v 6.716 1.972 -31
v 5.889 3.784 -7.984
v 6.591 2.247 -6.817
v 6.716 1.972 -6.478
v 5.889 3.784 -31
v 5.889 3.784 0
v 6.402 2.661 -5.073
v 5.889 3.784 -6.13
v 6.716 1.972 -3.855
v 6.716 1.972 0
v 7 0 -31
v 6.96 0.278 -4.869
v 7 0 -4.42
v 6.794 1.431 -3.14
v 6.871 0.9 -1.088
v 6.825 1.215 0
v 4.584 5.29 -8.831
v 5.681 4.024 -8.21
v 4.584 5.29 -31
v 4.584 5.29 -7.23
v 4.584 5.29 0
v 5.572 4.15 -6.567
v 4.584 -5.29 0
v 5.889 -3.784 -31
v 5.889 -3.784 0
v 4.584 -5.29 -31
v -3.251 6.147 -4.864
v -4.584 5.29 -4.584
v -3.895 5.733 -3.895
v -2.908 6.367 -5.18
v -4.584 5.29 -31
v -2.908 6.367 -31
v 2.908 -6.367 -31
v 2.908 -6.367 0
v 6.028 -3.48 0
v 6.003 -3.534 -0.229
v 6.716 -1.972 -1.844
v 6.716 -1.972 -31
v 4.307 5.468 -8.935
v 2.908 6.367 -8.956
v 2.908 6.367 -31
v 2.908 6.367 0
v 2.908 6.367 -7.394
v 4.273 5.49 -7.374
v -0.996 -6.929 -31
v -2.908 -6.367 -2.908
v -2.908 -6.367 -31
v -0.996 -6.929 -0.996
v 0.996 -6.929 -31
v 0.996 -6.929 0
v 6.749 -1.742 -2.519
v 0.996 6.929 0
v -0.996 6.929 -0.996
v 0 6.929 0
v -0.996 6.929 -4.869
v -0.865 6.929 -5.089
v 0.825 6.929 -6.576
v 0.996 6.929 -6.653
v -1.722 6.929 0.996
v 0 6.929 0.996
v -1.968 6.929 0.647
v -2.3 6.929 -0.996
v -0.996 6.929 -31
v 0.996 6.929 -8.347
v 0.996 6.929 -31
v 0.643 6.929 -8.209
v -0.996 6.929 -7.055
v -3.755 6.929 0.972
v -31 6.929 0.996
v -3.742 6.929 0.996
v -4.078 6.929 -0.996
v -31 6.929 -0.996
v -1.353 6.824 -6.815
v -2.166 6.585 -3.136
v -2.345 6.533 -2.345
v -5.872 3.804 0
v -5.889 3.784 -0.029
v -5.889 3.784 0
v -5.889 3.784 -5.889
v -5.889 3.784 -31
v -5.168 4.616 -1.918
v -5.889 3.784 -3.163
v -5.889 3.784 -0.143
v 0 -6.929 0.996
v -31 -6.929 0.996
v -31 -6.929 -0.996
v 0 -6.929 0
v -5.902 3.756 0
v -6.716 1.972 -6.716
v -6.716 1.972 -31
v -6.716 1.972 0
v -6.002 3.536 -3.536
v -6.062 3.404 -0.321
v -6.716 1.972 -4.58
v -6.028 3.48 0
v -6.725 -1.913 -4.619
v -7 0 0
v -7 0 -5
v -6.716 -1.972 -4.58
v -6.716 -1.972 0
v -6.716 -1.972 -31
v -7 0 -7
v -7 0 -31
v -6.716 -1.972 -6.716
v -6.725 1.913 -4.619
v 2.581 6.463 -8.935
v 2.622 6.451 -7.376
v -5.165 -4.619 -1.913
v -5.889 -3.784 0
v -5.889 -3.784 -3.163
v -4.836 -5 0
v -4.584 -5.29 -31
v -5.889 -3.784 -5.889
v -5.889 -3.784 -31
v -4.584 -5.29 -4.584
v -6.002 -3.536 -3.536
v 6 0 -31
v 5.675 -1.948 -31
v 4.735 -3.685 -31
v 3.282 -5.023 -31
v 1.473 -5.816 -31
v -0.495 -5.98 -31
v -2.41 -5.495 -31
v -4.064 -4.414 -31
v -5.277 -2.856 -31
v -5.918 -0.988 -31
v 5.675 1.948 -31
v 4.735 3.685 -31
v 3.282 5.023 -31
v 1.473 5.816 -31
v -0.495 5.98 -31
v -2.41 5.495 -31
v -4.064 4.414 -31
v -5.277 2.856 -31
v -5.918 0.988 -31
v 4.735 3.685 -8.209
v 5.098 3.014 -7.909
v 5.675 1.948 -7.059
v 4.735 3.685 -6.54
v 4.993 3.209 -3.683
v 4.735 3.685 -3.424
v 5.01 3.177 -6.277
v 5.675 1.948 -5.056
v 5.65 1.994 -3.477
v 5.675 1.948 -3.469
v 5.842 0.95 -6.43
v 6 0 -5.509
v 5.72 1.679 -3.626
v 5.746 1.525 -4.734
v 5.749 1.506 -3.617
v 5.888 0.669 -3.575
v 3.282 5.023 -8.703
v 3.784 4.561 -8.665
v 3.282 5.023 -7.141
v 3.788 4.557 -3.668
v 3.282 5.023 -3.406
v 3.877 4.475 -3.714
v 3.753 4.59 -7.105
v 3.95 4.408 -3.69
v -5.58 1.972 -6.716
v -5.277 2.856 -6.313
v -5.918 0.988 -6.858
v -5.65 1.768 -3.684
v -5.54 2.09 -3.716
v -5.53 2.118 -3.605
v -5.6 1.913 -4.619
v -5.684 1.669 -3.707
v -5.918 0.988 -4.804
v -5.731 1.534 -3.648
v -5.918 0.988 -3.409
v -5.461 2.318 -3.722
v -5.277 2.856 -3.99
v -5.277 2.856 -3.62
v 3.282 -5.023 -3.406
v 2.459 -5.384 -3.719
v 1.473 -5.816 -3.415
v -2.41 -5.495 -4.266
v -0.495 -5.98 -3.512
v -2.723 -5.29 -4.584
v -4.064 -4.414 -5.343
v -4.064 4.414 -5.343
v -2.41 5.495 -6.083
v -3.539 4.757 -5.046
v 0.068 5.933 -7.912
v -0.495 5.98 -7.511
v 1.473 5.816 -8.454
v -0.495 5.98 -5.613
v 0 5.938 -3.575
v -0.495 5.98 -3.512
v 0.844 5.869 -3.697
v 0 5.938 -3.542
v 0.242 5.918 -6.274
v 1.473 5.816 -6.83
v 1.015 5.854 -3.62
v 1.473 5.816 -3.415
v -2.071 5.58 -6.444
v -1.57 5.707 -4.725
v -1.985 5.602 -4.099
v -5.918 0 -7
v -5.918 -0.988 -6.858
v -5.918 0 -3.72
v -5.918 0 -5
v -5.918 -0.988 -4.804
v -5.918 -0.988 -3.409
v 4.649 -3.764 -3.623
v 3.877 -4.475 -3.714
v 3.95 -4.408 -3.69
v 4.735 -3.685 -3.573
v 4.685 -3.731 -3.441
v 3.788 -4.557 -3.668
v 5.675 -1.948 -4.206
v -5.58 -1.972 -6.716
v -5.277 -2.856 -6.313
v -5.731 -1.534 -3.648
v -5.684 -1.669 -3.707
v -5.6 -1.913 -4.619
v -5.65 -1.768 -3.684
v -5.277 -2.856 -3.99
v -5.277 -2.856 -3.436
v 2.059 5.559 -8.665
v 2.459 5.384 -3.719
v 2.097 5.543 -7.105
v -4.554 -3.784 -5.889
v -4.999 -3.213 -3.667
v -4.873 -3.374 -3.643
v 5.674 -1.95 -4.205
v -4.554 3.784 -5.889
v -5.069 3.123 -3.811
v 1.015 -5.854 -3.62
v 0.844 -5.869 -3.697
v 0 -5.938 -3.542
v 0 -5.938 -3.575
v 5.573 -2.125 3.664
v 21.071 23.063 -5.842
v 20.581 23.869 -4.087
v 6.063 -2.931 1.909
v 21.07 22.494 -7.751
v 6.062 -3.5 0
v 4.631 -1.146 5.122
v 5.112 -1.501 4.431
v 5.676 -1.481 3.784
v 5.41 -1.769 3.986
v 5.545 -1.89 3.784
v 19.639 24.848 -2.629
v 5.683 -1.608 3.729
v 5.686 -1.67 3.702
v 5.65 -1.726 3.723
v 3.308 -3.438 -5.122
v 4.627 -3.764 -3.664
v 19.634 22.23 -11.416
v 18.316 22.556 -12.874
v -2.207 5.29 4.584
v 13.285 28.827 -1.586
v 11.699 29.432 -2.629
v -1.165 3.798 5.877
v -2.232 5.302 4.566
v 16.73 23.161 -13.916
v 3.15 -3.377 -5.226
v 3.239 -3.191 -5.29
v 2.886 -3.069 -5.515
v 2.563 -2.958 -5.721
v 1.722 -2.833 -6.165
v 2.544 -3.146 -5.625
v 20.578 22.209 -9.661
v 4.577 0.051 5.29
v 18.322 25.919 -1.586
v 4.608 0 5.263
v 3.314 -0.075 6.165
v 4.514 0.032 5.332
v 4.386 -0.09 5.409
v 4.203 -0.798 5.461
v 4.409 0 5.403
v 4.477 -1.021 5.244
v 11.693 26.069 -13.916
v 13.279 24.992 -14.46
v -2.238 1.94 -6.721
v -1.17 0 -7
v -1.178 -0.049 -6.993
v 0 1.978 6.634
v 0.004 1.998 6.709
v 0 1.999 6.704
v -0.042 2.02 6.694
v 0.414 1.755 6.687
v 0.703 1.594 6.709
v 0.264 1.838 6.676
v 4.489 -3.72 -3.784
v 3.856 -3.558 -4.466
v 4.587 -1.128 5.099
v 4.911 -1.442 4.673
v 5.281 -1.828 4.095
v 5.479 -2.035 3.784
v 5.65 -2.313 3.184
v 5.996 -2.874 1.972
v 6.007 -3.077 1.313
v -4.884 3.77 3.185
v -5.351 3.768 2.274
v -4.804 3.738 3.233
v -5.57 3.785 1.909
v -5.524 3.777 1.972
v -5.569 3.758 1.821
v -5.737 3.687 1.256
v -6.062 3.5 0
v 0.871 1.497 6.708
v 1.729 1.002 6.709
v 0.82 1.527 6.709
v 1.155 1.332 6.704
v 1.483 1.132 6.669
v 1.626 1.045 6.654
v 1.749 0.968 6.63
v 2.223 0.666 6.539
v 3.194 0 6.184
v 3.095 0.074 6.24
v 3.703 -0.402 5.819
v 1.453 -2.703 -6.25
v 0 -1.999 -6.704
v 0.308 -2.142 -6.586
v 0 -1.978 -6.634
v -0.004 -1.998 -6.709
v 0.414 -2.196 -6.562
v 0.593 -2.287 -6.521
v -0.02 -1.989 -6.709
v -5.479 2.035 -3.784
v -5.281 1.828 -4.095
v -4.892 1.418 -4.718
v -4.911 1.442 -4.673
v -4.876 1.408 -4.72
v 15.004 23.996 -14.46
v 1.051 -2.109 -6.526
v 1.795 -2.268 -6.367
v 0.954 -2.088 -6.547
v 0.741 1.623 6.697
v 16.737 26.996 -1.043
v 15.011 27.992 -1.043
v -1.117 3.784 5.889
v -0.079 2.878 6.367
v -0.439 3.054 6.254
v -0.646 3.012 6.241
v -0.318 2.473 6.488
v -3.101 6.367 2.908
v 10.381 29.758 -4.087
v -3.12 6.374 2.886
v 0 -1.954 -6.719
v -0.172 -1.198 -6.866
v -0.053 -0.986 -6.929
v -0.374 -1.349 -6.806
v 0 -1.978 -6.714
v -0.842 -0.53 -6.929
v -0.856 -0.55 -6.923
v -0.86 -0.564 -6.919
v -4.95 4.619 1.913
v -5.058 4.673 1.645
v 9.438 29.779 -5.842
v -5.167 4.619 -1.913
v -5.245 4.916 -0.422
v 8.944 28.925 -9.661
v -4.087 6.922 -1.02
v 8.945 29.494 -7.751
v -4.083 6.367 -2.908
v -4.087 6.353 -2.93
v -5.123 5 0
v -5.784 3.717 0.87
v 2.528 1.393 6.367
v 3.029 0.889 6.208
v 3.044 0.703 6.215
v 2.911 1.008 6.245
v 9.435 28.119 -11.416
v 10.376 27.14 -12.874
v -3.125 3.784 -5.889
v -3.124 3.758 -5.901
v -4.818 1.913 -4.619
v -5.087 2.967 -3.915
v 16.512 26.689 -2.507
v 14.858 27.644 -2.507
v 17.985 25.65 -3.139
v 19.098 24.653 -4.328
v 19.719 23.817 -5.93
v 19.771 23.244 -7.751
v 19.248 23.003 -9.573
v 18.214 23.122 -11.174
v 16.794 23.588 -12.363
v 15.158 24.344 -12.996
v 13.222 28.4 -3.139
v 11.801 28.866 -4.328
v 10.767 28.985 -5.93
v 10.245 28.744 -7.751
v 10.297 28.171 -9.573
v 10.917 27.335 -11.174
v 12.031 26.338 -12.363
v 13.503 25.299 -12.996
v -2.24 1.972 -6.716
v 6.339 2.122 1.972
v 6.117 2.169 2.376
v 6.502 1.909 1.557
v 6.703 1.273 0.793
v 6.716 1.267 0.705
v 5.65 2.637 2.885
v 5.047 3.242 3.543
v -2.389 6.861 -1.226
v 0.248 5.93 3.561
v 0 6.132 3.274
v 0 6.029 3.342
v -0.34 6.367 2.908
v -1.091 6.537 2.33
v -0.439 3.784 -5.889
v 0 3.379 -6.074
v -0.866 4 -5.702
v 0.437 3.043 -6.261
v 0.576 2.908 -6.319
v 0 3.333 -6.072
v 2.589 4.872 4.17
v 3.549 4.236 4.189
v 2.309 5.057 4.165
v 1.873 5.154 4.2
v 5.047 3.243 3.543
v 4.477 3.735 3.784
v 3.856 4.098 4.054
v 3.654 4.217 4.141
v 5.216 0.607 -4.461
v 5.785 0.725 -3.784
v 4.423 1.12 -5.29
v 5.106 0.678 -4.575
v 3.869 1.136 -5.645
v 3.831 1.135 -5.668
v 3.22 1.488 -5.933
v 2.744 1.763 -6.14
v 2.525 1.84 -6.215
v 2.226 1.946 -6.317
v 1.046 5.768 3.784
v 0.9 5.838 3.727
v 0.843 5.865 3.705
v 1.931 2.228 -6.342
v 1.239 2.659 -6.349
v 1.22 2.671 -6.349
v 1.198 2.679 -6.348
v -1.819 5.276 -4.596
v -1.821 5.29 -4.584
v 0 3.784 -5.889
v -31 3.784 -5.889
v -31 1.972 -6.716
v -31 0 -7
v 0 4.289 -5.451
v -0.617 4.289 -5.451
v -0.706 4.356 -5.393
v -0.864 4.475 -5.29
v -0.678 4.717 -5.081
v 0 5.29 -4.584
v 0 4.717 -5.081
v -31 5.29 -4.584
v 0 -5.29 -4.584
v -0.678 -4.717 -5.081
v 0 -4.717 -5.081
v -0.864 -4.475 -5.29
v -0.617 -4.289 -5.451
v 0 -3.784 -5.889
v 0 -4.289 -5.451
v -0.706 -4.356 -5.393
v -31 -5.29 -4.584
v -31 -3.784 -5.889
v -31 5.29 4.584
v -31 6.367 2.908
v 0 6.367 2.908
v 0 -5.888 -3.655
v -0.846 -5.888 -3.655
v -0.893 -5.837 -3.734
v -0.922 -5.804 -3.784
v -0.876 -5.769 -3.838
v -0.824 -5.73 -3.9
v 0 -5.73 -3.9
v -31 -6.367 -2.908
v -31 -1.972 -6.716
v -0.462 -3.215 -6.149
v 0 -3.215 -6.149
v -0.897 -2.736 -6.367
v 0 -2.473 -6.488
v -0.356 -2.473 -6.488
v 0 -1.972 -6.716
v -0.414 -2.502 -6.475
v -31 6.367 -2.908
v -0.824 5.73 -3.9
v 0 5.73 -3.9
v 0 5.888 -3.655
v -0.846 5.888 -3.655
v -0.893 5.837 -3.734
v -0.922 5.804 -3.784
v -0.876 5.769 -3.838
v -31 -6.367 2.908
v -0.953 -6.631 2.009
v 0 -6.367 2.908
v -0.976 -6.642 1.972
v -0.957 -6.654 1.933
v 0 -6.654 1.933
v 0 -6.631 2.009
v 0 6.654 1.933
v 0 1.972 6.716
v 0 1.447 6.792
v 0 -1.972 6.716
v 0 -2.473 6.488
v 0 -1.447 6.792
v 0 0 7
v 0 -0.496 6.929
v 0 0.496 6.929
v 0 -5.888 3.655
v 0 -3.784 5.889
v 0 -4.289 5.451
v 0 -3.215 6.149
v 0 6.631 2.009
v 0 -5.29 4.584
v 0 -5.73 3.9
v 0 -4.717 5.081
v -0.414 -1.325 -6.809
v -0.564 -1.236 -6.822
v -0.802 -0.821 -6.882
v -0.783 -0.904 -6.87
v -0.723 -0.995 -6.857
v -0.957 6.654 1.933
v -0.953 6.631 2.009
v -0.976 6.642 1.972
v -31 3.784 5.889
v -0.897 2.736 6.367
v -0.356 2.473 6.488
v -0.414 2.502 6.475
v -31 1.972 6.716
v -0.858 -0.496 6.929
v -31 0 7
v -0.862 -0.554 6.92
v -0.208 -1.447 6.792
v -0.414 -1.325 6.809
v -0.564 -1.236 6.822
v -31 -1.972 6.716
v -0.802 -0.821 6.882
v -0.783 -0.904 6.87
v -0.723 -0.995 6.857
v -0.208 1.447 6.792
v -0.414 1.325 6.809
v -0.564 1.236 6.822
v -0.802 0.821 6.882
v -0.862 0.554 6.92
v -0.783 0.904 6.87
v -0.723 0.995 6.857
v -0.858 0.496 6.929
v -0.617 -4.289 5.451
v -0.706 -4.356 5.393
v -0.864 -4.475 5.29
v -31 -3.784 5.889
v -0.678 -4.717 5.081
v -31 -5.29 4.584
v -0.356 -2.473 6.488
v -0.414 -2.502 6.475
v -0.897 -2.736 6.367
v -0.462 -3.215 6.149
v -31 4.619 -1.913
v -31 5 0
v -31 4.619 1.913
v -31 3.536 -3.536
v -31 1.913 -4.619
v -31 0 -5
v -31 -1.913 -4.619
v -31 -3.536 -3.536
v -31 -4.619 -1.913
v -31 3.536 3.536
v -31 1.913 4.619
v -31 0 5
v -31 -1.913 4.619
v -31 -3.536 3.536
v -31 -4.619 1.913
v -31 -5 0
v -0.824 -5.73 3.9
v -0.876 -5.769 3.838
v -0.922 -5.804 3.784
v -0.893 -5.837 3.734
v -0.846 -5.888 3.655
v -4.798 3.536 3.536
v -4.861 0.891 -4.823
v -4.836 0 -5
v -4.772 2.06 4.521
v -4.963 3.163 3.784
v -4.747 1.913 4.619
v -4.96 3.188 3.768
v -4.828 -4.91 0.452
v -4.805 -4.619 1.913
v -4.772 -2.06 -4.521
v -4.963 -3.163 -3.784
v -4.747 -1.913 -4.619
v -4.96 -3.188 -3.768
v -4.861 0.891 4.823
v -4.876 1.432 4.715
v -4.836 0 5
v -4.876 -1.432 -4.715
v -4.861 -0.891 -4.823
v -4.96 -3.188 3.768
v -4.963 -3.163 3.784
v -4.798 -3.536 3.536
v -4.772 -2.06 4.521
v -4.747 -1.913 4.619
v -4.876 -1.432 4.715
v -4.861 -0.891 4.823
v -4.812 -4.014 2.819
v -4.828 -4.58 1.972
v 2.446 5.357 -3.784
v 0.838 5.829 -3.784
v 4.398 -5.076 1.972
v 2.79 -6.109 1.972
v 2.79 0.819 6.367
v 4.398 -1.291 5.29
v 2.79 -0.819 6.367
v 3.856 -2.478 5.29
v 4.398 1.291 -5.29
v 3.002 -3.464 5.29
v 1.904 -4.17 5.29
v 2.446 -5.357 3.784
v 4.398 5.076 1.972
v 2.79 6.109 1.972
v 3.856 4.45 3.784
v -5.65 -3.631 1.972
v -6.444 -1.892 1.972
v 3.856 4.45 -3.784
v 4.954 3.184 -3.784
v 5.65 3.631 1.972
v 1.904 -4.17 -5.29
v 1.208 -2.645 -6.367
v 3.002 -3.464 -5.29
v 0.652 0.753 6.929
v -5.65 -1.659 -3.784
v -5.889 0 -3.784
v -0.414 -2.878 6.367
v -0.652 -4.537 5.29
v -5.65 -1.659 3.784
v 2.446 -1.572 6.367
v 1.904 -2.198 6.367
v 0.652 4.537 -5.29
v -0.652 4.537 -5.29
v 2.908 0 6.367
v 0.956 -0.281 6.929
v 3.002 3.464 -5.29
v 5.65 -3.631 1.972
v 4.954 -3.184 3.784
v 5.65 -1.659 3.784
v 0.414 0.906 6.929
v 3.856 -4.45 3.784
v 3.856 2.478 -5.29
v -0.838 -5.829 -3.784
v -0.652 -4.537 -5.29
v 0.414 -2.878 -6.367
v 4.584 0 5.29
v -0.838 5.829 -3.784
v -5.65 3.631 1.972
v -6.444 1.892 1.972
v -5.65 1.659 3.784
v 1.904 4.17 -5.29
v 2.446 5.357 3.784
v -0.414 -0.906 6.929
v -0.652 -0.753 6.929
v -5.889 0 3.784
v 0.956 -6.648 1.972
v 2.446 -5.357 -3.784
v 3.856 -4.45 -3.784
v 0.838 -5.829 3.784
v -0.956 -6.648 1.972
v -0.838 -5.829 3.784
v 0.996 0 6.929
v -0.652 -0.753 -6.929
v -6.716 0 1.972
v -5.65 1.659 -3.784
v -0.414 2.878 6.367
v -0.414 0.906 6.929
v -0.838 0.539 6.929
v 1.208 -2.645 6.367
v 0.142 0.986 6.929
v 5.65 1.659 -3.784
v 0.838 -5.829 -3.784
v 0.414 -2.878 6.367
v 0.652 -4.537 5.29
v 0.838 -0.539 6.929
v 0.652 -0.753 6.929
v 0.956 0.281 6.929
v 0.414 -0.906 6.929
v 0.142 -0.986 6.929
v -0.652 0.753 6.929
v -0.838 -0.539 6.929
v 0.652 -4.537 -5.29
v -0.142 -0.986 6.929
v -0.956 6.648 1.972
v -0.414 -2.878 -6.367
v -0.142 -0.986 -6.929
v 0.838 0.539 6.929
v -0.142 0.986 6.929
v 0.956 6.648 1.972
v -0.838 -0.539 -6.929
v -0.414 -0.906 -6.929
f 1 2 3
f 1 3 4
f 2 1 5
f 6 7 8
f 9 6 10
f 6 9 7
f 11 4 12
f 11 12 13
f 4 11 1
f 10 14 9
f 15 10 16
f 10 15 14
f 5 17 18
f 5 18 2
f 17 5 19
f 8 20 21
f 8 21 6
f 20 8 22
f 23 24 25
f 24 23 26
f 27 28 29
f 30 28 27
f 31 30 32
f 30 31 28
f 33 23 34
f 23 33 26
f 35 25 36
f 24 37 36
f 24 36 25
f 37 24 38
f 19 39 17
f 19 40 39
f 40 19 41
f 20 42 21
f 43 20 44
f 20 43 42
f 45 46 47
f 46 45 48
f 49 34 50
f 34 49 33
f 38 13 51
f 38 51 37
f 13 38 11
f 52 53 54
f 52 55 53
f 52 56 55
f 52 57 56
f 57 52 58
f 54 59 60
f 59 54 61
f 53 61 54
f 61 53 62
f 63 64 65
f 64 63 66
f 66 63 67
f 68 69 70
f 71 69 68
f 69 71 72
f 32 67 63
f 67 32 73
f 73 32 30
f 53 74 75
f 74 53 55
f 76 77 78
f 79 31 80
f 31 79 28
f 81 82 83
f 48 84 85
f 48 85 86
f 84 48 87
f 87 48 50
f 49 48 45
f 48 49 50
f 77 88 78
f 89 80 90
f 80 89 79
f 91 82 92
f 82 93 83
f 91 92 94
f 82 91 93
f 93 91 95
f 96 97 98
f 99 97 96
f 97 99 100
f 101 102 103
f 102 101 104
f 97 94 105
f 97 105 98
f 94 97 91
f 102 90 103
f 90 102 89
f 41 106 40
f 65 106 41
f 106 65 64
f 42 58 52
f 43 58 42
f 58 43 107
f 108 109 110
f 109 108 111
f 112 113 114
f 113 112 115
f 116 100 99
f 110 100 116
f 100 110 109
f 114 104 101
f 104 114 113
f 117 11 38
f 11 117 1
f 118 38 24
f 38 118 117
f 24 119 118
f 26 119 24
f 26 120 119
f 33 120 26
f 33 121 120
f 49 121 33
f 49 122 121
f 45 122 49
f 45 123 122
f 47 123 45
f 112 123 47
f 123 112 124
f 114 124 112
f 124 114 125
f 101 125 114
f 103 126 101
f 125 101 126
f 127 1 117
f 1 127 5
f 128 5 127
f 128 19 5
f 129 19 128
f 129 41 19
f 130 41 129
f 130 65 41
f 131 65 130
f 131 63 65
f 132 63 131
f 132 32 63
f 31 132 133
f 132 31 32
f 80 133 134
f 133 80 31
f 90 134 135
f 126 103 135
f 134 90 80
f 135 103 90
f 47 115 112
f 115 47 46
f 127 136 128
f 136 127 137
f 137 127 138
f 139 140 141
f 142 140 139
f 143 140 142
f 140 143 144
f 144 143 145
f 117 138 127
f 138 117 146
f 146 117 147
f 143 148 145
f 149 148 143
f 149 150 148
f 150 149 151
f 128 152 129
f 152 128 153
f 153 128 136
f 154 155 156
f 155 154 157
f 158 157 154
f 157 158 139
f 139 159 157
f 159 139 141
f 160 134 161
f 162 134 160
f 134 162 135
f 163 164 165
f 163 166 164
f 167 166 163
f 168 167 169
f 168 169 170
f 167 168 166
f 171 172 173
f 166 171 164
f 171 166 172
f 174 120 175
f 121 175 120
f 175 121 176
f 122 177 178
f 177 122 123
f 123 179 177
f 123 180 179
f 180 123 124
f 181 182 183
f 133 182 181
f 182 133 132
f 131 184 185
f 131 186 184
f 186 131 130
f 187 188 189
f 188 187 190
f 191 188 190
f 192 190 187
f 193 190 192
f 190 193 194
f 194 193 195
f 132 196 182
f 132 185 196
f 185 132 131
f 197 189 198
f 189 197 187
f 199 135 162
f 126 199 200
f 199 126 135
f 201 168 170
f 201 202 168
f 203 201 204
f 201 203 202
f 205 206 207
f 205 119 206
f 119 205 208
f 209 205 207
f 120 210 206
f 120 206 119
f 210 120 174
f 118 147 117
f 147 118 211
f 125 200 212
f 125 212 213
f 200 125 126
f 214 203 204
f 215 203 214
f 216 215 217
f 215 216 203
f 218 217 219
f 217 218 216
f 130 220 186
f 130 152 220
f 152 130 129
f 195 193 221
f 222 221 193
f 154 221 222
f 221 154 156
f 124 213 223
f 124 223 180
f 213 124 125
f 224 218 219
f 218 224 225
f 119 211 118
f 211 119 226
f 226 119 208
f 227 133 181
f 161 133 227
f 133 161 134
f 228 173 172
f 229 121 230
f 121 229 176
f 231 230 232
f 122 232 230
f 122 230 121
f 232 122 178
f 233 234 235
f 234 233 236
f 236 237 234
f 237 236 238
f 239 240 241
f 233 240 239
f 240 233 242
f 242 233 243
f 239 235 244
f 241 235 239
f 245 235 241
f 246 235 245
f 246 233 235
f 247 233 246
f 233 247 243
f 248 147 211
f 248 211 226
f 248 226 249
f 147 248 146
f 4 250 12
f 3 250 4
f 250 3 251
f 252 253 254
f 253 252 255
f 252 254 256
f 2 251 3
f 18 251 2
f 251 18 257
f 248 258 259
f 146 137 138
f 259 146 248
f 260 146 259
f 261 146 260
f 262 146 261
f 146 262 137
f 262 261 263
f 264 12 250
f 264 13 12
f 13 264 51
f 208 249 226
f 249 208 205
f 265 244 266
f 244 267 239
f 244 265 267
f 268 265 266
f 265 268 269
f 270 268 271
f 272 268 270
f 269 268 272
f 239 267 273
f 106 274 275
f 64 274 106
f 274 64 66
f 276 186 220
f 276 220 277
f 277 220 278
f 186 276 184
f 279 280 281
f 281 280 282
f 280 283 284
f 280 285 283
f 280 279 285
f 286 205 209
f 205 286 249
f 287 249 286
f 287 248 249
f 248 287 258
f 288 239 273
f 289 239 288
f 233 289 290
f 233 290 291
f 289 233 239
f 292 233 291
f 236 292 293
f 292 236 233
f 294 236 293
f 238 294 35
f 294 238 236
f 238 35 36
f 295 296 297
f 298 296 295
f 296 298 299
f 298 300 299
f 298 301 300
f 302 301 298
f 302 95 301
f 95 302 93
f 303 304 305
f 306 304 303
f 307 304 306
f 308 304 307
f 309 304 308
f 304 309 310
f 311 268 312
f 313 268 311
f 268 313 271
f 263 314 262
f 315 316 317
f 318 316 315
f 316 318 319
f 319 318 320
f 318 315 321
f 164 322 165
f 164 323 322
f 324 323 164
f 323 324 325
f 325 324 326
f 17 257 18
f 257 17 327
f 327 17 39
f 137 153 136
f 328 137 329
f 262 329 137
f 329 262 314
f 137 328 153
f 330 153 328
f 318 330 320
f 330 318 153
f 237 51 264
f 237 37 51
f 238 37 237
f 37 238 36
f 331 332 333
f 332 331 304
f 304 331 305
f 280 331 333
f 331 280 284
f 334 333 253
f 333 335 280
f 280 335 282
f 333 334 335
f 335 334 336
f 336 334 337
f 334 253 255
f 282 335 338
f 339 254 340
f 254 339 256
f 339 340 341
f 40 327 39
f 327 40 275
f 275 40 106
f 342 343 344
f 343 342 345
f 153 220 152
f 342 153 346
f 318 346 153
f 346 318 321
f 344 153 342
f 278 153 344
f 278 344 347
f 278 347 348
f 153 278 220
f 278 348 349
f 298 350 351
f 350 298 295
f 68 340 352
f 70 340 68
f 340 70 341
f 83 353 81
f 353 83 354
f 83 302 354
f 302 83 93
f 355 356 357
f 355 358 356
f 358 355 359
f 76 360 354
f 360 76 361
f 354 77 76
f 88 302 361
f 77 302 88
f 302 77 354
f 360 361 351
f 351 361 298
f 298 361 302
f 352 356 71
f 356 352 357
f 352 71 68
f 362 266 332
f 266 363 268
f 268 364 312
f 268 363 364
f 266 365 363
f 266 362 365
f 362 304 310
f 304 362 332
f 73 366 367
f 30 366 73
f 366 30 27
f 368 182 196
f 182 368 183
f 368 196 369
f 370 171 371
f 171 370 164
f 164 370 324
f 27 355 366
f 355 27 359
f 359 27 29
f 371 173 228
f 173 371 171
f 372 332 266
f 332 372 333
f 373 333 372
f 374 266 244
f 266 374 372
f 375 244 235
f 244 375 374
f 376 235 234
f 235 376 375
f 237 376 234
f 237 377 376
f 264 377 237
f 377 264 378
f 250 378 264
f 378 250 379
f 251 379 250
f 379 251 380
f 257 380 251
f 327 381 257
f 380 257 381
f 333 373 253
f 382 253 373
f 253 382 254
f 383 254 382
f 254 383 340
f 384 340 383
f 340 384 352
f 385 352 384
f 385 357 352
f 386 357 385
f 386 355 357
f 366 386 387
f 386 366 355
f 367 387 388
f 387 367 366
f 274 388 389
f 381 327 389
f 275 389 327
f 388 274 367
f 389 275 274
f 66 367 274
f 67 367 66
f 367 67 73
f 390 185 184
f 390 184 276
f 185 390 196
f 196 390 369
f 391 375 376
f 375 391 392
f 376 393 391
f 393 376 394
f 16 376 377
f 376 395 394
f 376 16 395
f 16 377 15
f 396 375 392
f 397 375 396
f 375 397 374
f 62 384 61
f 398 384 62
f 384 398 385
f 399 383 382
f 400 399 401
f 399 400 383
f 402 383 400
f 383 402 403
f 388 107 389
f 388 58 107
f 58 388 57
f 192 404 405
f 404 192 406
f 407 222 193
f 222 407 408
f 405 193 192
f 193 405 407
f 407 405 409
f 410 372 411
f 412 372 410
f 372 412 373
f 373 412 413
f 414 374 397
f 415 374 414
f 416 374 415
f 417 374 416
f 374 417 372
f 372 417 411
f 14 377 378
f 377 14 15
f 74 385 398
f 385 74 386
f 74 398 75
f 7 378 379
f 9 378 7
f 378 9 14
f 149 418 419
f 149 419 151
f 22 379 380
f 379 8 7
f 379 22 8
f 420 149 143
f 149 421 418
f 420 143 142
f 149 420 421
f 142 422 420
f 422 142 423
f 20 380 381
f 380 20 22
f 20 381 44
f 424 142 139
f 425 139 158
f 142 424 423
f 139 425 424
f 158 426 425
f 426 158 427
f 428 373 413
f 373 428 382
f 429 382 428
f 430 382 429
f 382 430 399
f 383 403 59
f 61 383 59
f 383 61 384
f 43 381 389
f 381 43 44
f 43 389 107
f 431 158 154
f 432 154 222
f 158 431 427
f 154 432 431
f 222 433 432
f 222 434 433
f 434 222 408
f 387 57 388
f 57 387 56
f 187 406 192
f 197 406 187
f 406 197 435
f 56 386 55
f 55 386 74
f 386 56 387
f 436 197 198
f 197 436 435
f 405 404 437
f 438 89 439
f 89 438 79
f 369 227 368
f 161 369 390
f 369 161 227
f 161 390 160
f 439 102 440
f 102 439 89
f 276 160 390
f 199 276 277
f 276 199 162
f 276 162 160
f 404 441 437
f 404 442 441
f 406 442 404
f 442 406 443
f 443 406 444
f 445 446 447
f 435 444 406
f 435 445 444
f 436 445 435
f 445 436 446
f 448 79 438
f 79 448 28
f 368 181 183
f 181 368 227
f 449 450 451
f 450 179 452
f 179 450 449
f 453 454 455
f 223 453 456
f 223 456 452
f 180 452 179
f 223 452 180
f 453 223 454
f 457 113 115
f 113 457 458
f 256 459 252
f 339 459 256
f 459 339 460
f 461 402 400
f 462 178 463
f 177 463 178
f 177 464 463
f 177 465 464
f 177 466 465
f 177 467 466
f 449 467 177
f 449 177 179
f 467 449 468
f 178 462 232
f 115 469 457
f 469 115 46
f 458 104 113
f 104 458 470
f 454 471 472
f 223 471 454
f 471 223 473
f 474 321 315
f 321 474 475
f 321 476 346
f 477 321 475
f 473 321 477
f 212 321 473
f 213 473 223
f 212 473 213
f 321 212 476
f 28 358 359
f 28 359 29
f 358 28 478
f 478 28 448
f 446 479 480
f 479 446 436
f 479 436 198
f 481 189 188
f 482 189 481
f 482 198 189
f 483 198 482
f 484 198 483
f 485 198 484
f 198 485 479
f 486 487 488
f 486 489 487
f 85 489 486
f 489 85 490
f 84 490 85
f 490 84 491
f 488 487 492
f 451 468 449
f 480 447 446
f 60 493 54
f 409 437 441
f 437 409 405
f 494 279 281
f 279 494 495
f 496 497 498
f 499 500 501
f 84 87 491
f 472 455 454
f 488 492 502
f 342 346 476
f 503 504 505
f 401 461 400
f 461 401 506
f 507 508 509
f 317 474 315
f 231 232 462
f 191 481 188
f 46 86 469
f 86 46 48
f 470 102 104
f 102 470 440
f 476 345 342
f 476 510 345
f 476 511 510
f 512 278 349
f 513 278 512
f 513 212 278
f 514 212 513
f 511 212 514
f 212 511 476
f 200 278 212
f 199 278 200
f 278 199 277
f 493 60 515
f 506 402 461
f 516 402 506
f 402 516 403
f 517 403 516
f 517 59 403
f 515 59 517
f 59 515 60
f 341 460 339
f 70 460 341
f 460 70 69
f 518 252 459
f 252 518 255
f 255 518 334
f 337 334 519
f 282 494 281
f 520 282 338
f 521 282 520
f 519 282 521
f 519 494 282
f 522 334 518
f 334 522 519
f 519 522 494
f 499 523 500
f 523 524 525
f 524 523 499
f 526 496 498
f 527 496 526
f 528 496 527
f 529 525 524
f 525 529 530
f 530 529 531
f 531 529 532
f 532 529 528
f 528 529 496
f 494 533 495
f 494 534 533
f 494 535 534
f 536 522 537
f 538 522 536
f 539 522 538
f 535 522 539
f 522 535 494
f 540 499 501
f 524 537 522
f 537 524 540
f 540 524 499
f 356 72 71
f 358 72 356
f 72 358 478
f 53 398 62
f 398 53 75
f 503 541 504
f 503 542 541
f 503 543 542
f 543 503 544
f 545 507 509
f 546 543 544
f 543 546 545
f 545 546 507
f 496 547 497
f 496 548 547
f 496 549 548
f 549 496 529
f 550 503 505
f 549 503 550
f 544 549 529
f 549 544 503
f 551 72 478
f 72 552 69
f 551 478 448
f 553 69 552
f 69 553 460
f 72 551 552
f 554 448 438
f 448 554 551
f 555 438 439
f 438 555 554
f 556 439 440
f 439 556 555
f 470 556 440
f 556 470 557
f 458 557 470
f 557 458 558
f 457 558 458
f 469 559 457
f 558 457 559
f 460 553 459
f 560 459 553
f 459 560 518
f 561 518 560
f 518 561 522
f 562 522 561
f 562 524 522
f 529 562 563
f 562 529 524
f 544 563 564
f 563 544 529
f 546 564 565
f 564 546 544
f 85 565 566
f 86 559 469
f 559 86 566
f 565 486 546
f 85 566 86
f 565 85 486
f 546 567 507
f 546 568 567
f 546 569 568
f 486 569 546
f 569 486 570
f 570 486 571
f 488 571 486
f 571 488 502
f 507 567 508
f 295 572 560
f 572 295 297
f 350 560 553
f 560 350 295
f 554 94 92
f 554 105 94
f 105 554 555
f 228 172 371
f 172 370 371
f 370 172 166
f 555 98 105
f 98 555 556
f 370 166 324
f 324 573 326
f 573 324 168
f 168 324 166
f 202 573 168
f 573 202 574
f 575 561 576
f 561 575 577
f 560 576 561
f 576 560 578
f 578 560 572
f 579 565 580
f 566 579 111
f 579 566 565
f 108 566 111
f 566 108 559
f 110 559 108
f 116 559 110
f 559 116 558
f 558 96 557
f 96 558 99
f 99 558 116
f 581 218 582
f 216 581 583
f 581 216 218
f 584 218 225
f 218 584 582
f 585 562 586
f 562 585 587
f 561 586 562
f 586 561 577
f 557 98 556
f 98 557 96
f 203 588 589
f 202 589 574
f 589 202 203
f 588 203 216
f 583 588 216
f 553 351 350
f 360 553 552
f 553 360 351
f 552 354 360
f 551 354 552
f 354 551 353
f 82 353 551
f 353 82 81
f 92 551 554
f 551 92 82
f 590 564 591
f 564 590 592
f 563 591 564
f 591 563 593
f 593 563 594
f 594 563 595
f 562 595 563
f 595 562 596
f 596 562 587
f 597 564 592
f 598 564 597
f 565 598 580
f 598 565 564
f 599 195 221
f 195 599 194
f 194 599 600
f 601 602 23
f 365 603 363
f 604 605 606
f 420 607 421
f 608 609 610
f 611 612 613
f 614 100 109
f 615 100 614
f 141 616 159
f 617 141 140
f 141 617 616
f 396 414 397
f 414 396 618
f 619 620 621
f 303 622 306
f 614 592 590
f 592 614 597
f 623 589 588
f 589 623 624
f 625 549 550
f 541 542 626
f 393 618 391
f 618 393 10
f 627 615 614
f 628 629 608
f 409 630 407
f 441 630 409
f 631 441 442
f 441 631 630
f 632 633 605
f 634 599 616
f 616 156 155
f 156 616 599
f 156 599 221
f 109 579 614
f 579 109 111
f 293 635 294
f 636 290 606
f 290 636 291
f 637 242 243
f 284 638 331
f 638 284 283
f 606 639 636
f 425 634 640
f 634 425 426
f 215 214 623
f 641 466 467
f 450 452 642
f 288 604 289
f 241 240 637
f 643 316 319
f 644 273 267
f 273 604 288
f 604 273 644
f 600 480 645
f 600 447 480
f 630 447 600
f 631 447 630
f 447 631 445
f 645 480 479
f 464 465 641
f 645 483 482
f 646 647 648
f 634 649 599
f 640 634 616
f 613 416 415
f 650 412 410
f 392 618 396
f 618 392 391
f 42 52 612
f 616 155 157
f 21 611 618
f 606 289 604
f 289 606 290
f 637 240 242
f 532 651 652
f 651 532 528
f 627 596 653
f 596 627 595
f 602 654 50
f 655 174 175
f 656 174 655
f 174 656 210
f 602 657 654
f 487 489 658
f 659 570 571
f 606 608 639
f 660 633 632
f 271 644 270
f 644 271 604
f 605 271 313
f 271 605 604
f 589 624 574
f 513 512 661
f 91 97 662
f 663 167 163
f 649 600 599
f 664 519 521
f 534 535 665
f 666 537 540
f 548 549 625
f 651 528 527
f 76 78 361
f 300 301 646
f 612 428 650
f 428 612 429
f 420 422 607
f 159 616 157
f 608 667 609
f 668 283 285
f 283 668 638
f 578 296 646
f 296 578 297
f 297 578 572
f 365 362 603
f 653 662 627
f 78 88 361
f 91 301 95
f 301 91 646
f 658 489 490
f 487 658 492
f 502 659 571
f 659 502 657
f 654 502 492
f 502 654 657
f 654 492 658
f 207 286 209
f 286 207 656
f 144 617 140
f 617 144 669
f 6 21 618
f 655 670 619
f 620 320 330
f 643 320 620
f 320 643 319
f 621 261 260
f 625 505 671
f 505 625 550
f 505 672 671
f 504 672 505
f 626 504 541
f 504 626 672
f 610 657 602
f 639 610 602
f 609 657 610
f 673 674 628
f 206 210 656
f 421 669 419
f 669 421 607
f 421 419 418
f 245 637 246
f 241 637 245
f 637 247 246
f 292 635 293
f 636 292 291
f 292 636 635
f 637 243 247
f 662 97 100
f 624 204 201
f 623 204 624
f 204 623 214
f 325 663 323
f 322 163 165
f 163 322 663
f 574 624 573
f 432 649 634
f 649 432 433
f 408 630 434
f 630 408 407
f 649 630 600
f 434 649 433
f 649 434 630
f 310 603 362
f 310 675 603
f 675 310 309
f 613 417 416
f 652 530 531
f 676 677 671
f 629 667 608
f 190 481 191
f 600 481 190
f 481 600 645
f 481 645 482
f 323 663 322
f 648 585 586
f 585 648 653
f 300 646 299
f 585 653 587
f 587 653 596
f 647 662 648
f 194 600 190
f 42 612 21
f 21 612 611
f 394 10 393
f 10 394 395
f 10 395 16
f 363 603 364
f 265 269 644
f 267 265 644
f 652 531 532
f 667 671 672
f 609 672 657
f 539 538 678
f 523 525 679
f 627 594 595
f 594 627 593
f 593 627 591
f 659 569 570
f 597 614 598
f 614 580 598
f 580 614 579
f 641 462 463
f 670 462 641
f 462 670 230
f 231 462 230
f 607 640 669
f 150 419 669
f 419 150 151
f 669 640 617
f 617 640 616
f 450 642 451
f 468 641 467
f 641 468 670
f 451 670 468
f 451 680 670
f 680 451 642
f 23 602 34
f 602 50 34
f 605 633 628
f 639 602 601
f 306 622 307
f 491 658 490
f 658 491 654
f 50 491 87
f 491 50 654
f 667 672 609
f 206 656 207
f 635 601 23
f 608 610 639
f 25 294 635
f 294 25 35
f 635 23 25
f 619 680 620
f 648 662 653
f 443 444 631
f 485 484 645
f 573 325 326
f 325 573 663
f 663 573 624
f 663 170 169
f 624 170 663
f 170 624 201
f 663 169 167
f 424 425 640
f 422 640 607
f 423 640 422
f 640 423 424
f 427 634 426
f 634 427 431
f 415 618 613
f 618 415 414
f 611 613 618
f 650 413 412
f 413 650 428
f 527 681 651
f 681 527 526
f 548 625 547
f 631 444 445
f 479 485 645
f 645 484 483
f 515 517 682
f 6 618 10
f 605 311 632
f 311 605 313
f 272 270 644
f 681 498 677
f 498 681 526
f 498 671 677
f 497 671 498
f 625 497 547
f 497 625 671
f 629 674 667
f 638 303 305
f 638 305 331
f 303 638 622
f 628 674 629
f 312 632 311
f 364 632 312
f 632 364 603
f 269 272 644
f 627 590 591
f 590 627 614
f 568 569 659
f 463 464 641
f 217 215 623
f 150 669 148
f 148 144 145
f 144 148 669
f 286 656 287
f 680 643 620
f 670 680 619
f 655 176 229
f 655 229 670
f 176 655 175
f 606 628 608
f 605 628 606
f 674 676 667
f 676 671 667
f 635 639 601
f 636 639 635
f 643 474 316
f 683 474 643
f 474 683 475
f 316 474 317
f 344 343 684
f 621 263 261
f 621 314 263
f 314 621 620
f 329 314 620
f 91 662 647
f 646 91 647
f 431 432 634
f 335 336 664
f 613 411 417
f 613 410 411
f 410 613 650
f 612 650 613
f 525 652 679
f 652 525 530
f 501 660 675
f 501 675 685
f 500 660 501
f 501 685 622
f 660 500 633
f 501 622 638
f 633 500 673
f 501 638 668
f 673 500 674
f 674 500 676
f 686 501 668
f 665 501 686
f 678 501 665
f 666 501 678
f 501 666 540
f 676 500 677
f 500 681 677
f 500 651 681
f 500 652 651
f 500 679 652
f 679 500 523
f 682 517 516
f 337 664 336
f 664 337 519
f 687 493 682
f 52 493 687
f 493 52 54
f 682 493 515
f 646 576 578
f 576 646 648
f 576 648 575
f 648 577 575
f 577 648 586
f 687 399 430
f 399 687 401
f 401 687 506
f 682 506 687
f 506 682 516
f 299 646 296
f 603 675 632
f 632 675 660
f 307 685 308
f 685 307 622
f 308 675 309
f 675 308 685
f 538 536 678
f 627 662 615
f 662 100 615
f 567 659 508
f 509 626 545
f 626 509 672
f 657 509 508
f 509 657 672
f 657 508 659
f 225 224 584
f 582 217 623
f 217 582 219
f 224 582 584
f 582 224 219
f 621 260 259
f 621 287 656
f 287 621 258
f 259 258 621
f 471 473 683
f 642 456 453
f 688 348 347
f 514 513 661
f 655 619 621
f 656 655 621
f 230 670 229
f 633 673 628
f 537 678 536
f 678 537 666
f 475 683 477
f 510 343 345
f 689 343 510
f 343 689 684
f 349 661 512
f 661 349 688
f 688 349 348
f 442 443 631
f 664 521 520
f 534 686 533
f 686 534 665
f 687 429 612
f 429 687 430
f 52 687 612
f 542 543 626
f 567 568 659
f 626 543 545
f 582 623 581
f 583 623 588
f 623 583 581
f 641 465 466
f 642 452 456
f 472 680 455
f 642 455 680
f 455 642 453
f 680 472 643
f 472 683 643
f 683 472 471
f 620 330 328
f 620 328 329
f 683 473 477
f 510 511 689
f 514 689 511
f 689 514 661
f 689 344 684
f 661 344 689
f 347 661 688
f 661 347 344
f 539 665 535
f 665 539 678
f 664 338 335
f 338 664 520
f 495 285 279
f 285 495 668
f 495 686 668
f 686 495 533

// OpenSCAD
width=10;

sphere (7);

//cylinder 1 z たて
difference(){
    translate ([0,0,-31])cylinder(h=31, d=14);
    translate([0,0,-33])cylinder(h=30, d=12);
}

//cylinder 2
rotate([75.52,0,-30])difference(){
        translate ([0,0,-31])
        cylinder (h=31, d=14);
        translate([0,0,-32])
        cylinder(h=31, d=11); 
        }

//cylinder 3        
translate([-31,0,0]) rotate([0,90,0])difference(){
        cylinder (h=31, d=14);
        translate([0,0,+3]) ;
        cylinder(h=30, d=10); 
        }
